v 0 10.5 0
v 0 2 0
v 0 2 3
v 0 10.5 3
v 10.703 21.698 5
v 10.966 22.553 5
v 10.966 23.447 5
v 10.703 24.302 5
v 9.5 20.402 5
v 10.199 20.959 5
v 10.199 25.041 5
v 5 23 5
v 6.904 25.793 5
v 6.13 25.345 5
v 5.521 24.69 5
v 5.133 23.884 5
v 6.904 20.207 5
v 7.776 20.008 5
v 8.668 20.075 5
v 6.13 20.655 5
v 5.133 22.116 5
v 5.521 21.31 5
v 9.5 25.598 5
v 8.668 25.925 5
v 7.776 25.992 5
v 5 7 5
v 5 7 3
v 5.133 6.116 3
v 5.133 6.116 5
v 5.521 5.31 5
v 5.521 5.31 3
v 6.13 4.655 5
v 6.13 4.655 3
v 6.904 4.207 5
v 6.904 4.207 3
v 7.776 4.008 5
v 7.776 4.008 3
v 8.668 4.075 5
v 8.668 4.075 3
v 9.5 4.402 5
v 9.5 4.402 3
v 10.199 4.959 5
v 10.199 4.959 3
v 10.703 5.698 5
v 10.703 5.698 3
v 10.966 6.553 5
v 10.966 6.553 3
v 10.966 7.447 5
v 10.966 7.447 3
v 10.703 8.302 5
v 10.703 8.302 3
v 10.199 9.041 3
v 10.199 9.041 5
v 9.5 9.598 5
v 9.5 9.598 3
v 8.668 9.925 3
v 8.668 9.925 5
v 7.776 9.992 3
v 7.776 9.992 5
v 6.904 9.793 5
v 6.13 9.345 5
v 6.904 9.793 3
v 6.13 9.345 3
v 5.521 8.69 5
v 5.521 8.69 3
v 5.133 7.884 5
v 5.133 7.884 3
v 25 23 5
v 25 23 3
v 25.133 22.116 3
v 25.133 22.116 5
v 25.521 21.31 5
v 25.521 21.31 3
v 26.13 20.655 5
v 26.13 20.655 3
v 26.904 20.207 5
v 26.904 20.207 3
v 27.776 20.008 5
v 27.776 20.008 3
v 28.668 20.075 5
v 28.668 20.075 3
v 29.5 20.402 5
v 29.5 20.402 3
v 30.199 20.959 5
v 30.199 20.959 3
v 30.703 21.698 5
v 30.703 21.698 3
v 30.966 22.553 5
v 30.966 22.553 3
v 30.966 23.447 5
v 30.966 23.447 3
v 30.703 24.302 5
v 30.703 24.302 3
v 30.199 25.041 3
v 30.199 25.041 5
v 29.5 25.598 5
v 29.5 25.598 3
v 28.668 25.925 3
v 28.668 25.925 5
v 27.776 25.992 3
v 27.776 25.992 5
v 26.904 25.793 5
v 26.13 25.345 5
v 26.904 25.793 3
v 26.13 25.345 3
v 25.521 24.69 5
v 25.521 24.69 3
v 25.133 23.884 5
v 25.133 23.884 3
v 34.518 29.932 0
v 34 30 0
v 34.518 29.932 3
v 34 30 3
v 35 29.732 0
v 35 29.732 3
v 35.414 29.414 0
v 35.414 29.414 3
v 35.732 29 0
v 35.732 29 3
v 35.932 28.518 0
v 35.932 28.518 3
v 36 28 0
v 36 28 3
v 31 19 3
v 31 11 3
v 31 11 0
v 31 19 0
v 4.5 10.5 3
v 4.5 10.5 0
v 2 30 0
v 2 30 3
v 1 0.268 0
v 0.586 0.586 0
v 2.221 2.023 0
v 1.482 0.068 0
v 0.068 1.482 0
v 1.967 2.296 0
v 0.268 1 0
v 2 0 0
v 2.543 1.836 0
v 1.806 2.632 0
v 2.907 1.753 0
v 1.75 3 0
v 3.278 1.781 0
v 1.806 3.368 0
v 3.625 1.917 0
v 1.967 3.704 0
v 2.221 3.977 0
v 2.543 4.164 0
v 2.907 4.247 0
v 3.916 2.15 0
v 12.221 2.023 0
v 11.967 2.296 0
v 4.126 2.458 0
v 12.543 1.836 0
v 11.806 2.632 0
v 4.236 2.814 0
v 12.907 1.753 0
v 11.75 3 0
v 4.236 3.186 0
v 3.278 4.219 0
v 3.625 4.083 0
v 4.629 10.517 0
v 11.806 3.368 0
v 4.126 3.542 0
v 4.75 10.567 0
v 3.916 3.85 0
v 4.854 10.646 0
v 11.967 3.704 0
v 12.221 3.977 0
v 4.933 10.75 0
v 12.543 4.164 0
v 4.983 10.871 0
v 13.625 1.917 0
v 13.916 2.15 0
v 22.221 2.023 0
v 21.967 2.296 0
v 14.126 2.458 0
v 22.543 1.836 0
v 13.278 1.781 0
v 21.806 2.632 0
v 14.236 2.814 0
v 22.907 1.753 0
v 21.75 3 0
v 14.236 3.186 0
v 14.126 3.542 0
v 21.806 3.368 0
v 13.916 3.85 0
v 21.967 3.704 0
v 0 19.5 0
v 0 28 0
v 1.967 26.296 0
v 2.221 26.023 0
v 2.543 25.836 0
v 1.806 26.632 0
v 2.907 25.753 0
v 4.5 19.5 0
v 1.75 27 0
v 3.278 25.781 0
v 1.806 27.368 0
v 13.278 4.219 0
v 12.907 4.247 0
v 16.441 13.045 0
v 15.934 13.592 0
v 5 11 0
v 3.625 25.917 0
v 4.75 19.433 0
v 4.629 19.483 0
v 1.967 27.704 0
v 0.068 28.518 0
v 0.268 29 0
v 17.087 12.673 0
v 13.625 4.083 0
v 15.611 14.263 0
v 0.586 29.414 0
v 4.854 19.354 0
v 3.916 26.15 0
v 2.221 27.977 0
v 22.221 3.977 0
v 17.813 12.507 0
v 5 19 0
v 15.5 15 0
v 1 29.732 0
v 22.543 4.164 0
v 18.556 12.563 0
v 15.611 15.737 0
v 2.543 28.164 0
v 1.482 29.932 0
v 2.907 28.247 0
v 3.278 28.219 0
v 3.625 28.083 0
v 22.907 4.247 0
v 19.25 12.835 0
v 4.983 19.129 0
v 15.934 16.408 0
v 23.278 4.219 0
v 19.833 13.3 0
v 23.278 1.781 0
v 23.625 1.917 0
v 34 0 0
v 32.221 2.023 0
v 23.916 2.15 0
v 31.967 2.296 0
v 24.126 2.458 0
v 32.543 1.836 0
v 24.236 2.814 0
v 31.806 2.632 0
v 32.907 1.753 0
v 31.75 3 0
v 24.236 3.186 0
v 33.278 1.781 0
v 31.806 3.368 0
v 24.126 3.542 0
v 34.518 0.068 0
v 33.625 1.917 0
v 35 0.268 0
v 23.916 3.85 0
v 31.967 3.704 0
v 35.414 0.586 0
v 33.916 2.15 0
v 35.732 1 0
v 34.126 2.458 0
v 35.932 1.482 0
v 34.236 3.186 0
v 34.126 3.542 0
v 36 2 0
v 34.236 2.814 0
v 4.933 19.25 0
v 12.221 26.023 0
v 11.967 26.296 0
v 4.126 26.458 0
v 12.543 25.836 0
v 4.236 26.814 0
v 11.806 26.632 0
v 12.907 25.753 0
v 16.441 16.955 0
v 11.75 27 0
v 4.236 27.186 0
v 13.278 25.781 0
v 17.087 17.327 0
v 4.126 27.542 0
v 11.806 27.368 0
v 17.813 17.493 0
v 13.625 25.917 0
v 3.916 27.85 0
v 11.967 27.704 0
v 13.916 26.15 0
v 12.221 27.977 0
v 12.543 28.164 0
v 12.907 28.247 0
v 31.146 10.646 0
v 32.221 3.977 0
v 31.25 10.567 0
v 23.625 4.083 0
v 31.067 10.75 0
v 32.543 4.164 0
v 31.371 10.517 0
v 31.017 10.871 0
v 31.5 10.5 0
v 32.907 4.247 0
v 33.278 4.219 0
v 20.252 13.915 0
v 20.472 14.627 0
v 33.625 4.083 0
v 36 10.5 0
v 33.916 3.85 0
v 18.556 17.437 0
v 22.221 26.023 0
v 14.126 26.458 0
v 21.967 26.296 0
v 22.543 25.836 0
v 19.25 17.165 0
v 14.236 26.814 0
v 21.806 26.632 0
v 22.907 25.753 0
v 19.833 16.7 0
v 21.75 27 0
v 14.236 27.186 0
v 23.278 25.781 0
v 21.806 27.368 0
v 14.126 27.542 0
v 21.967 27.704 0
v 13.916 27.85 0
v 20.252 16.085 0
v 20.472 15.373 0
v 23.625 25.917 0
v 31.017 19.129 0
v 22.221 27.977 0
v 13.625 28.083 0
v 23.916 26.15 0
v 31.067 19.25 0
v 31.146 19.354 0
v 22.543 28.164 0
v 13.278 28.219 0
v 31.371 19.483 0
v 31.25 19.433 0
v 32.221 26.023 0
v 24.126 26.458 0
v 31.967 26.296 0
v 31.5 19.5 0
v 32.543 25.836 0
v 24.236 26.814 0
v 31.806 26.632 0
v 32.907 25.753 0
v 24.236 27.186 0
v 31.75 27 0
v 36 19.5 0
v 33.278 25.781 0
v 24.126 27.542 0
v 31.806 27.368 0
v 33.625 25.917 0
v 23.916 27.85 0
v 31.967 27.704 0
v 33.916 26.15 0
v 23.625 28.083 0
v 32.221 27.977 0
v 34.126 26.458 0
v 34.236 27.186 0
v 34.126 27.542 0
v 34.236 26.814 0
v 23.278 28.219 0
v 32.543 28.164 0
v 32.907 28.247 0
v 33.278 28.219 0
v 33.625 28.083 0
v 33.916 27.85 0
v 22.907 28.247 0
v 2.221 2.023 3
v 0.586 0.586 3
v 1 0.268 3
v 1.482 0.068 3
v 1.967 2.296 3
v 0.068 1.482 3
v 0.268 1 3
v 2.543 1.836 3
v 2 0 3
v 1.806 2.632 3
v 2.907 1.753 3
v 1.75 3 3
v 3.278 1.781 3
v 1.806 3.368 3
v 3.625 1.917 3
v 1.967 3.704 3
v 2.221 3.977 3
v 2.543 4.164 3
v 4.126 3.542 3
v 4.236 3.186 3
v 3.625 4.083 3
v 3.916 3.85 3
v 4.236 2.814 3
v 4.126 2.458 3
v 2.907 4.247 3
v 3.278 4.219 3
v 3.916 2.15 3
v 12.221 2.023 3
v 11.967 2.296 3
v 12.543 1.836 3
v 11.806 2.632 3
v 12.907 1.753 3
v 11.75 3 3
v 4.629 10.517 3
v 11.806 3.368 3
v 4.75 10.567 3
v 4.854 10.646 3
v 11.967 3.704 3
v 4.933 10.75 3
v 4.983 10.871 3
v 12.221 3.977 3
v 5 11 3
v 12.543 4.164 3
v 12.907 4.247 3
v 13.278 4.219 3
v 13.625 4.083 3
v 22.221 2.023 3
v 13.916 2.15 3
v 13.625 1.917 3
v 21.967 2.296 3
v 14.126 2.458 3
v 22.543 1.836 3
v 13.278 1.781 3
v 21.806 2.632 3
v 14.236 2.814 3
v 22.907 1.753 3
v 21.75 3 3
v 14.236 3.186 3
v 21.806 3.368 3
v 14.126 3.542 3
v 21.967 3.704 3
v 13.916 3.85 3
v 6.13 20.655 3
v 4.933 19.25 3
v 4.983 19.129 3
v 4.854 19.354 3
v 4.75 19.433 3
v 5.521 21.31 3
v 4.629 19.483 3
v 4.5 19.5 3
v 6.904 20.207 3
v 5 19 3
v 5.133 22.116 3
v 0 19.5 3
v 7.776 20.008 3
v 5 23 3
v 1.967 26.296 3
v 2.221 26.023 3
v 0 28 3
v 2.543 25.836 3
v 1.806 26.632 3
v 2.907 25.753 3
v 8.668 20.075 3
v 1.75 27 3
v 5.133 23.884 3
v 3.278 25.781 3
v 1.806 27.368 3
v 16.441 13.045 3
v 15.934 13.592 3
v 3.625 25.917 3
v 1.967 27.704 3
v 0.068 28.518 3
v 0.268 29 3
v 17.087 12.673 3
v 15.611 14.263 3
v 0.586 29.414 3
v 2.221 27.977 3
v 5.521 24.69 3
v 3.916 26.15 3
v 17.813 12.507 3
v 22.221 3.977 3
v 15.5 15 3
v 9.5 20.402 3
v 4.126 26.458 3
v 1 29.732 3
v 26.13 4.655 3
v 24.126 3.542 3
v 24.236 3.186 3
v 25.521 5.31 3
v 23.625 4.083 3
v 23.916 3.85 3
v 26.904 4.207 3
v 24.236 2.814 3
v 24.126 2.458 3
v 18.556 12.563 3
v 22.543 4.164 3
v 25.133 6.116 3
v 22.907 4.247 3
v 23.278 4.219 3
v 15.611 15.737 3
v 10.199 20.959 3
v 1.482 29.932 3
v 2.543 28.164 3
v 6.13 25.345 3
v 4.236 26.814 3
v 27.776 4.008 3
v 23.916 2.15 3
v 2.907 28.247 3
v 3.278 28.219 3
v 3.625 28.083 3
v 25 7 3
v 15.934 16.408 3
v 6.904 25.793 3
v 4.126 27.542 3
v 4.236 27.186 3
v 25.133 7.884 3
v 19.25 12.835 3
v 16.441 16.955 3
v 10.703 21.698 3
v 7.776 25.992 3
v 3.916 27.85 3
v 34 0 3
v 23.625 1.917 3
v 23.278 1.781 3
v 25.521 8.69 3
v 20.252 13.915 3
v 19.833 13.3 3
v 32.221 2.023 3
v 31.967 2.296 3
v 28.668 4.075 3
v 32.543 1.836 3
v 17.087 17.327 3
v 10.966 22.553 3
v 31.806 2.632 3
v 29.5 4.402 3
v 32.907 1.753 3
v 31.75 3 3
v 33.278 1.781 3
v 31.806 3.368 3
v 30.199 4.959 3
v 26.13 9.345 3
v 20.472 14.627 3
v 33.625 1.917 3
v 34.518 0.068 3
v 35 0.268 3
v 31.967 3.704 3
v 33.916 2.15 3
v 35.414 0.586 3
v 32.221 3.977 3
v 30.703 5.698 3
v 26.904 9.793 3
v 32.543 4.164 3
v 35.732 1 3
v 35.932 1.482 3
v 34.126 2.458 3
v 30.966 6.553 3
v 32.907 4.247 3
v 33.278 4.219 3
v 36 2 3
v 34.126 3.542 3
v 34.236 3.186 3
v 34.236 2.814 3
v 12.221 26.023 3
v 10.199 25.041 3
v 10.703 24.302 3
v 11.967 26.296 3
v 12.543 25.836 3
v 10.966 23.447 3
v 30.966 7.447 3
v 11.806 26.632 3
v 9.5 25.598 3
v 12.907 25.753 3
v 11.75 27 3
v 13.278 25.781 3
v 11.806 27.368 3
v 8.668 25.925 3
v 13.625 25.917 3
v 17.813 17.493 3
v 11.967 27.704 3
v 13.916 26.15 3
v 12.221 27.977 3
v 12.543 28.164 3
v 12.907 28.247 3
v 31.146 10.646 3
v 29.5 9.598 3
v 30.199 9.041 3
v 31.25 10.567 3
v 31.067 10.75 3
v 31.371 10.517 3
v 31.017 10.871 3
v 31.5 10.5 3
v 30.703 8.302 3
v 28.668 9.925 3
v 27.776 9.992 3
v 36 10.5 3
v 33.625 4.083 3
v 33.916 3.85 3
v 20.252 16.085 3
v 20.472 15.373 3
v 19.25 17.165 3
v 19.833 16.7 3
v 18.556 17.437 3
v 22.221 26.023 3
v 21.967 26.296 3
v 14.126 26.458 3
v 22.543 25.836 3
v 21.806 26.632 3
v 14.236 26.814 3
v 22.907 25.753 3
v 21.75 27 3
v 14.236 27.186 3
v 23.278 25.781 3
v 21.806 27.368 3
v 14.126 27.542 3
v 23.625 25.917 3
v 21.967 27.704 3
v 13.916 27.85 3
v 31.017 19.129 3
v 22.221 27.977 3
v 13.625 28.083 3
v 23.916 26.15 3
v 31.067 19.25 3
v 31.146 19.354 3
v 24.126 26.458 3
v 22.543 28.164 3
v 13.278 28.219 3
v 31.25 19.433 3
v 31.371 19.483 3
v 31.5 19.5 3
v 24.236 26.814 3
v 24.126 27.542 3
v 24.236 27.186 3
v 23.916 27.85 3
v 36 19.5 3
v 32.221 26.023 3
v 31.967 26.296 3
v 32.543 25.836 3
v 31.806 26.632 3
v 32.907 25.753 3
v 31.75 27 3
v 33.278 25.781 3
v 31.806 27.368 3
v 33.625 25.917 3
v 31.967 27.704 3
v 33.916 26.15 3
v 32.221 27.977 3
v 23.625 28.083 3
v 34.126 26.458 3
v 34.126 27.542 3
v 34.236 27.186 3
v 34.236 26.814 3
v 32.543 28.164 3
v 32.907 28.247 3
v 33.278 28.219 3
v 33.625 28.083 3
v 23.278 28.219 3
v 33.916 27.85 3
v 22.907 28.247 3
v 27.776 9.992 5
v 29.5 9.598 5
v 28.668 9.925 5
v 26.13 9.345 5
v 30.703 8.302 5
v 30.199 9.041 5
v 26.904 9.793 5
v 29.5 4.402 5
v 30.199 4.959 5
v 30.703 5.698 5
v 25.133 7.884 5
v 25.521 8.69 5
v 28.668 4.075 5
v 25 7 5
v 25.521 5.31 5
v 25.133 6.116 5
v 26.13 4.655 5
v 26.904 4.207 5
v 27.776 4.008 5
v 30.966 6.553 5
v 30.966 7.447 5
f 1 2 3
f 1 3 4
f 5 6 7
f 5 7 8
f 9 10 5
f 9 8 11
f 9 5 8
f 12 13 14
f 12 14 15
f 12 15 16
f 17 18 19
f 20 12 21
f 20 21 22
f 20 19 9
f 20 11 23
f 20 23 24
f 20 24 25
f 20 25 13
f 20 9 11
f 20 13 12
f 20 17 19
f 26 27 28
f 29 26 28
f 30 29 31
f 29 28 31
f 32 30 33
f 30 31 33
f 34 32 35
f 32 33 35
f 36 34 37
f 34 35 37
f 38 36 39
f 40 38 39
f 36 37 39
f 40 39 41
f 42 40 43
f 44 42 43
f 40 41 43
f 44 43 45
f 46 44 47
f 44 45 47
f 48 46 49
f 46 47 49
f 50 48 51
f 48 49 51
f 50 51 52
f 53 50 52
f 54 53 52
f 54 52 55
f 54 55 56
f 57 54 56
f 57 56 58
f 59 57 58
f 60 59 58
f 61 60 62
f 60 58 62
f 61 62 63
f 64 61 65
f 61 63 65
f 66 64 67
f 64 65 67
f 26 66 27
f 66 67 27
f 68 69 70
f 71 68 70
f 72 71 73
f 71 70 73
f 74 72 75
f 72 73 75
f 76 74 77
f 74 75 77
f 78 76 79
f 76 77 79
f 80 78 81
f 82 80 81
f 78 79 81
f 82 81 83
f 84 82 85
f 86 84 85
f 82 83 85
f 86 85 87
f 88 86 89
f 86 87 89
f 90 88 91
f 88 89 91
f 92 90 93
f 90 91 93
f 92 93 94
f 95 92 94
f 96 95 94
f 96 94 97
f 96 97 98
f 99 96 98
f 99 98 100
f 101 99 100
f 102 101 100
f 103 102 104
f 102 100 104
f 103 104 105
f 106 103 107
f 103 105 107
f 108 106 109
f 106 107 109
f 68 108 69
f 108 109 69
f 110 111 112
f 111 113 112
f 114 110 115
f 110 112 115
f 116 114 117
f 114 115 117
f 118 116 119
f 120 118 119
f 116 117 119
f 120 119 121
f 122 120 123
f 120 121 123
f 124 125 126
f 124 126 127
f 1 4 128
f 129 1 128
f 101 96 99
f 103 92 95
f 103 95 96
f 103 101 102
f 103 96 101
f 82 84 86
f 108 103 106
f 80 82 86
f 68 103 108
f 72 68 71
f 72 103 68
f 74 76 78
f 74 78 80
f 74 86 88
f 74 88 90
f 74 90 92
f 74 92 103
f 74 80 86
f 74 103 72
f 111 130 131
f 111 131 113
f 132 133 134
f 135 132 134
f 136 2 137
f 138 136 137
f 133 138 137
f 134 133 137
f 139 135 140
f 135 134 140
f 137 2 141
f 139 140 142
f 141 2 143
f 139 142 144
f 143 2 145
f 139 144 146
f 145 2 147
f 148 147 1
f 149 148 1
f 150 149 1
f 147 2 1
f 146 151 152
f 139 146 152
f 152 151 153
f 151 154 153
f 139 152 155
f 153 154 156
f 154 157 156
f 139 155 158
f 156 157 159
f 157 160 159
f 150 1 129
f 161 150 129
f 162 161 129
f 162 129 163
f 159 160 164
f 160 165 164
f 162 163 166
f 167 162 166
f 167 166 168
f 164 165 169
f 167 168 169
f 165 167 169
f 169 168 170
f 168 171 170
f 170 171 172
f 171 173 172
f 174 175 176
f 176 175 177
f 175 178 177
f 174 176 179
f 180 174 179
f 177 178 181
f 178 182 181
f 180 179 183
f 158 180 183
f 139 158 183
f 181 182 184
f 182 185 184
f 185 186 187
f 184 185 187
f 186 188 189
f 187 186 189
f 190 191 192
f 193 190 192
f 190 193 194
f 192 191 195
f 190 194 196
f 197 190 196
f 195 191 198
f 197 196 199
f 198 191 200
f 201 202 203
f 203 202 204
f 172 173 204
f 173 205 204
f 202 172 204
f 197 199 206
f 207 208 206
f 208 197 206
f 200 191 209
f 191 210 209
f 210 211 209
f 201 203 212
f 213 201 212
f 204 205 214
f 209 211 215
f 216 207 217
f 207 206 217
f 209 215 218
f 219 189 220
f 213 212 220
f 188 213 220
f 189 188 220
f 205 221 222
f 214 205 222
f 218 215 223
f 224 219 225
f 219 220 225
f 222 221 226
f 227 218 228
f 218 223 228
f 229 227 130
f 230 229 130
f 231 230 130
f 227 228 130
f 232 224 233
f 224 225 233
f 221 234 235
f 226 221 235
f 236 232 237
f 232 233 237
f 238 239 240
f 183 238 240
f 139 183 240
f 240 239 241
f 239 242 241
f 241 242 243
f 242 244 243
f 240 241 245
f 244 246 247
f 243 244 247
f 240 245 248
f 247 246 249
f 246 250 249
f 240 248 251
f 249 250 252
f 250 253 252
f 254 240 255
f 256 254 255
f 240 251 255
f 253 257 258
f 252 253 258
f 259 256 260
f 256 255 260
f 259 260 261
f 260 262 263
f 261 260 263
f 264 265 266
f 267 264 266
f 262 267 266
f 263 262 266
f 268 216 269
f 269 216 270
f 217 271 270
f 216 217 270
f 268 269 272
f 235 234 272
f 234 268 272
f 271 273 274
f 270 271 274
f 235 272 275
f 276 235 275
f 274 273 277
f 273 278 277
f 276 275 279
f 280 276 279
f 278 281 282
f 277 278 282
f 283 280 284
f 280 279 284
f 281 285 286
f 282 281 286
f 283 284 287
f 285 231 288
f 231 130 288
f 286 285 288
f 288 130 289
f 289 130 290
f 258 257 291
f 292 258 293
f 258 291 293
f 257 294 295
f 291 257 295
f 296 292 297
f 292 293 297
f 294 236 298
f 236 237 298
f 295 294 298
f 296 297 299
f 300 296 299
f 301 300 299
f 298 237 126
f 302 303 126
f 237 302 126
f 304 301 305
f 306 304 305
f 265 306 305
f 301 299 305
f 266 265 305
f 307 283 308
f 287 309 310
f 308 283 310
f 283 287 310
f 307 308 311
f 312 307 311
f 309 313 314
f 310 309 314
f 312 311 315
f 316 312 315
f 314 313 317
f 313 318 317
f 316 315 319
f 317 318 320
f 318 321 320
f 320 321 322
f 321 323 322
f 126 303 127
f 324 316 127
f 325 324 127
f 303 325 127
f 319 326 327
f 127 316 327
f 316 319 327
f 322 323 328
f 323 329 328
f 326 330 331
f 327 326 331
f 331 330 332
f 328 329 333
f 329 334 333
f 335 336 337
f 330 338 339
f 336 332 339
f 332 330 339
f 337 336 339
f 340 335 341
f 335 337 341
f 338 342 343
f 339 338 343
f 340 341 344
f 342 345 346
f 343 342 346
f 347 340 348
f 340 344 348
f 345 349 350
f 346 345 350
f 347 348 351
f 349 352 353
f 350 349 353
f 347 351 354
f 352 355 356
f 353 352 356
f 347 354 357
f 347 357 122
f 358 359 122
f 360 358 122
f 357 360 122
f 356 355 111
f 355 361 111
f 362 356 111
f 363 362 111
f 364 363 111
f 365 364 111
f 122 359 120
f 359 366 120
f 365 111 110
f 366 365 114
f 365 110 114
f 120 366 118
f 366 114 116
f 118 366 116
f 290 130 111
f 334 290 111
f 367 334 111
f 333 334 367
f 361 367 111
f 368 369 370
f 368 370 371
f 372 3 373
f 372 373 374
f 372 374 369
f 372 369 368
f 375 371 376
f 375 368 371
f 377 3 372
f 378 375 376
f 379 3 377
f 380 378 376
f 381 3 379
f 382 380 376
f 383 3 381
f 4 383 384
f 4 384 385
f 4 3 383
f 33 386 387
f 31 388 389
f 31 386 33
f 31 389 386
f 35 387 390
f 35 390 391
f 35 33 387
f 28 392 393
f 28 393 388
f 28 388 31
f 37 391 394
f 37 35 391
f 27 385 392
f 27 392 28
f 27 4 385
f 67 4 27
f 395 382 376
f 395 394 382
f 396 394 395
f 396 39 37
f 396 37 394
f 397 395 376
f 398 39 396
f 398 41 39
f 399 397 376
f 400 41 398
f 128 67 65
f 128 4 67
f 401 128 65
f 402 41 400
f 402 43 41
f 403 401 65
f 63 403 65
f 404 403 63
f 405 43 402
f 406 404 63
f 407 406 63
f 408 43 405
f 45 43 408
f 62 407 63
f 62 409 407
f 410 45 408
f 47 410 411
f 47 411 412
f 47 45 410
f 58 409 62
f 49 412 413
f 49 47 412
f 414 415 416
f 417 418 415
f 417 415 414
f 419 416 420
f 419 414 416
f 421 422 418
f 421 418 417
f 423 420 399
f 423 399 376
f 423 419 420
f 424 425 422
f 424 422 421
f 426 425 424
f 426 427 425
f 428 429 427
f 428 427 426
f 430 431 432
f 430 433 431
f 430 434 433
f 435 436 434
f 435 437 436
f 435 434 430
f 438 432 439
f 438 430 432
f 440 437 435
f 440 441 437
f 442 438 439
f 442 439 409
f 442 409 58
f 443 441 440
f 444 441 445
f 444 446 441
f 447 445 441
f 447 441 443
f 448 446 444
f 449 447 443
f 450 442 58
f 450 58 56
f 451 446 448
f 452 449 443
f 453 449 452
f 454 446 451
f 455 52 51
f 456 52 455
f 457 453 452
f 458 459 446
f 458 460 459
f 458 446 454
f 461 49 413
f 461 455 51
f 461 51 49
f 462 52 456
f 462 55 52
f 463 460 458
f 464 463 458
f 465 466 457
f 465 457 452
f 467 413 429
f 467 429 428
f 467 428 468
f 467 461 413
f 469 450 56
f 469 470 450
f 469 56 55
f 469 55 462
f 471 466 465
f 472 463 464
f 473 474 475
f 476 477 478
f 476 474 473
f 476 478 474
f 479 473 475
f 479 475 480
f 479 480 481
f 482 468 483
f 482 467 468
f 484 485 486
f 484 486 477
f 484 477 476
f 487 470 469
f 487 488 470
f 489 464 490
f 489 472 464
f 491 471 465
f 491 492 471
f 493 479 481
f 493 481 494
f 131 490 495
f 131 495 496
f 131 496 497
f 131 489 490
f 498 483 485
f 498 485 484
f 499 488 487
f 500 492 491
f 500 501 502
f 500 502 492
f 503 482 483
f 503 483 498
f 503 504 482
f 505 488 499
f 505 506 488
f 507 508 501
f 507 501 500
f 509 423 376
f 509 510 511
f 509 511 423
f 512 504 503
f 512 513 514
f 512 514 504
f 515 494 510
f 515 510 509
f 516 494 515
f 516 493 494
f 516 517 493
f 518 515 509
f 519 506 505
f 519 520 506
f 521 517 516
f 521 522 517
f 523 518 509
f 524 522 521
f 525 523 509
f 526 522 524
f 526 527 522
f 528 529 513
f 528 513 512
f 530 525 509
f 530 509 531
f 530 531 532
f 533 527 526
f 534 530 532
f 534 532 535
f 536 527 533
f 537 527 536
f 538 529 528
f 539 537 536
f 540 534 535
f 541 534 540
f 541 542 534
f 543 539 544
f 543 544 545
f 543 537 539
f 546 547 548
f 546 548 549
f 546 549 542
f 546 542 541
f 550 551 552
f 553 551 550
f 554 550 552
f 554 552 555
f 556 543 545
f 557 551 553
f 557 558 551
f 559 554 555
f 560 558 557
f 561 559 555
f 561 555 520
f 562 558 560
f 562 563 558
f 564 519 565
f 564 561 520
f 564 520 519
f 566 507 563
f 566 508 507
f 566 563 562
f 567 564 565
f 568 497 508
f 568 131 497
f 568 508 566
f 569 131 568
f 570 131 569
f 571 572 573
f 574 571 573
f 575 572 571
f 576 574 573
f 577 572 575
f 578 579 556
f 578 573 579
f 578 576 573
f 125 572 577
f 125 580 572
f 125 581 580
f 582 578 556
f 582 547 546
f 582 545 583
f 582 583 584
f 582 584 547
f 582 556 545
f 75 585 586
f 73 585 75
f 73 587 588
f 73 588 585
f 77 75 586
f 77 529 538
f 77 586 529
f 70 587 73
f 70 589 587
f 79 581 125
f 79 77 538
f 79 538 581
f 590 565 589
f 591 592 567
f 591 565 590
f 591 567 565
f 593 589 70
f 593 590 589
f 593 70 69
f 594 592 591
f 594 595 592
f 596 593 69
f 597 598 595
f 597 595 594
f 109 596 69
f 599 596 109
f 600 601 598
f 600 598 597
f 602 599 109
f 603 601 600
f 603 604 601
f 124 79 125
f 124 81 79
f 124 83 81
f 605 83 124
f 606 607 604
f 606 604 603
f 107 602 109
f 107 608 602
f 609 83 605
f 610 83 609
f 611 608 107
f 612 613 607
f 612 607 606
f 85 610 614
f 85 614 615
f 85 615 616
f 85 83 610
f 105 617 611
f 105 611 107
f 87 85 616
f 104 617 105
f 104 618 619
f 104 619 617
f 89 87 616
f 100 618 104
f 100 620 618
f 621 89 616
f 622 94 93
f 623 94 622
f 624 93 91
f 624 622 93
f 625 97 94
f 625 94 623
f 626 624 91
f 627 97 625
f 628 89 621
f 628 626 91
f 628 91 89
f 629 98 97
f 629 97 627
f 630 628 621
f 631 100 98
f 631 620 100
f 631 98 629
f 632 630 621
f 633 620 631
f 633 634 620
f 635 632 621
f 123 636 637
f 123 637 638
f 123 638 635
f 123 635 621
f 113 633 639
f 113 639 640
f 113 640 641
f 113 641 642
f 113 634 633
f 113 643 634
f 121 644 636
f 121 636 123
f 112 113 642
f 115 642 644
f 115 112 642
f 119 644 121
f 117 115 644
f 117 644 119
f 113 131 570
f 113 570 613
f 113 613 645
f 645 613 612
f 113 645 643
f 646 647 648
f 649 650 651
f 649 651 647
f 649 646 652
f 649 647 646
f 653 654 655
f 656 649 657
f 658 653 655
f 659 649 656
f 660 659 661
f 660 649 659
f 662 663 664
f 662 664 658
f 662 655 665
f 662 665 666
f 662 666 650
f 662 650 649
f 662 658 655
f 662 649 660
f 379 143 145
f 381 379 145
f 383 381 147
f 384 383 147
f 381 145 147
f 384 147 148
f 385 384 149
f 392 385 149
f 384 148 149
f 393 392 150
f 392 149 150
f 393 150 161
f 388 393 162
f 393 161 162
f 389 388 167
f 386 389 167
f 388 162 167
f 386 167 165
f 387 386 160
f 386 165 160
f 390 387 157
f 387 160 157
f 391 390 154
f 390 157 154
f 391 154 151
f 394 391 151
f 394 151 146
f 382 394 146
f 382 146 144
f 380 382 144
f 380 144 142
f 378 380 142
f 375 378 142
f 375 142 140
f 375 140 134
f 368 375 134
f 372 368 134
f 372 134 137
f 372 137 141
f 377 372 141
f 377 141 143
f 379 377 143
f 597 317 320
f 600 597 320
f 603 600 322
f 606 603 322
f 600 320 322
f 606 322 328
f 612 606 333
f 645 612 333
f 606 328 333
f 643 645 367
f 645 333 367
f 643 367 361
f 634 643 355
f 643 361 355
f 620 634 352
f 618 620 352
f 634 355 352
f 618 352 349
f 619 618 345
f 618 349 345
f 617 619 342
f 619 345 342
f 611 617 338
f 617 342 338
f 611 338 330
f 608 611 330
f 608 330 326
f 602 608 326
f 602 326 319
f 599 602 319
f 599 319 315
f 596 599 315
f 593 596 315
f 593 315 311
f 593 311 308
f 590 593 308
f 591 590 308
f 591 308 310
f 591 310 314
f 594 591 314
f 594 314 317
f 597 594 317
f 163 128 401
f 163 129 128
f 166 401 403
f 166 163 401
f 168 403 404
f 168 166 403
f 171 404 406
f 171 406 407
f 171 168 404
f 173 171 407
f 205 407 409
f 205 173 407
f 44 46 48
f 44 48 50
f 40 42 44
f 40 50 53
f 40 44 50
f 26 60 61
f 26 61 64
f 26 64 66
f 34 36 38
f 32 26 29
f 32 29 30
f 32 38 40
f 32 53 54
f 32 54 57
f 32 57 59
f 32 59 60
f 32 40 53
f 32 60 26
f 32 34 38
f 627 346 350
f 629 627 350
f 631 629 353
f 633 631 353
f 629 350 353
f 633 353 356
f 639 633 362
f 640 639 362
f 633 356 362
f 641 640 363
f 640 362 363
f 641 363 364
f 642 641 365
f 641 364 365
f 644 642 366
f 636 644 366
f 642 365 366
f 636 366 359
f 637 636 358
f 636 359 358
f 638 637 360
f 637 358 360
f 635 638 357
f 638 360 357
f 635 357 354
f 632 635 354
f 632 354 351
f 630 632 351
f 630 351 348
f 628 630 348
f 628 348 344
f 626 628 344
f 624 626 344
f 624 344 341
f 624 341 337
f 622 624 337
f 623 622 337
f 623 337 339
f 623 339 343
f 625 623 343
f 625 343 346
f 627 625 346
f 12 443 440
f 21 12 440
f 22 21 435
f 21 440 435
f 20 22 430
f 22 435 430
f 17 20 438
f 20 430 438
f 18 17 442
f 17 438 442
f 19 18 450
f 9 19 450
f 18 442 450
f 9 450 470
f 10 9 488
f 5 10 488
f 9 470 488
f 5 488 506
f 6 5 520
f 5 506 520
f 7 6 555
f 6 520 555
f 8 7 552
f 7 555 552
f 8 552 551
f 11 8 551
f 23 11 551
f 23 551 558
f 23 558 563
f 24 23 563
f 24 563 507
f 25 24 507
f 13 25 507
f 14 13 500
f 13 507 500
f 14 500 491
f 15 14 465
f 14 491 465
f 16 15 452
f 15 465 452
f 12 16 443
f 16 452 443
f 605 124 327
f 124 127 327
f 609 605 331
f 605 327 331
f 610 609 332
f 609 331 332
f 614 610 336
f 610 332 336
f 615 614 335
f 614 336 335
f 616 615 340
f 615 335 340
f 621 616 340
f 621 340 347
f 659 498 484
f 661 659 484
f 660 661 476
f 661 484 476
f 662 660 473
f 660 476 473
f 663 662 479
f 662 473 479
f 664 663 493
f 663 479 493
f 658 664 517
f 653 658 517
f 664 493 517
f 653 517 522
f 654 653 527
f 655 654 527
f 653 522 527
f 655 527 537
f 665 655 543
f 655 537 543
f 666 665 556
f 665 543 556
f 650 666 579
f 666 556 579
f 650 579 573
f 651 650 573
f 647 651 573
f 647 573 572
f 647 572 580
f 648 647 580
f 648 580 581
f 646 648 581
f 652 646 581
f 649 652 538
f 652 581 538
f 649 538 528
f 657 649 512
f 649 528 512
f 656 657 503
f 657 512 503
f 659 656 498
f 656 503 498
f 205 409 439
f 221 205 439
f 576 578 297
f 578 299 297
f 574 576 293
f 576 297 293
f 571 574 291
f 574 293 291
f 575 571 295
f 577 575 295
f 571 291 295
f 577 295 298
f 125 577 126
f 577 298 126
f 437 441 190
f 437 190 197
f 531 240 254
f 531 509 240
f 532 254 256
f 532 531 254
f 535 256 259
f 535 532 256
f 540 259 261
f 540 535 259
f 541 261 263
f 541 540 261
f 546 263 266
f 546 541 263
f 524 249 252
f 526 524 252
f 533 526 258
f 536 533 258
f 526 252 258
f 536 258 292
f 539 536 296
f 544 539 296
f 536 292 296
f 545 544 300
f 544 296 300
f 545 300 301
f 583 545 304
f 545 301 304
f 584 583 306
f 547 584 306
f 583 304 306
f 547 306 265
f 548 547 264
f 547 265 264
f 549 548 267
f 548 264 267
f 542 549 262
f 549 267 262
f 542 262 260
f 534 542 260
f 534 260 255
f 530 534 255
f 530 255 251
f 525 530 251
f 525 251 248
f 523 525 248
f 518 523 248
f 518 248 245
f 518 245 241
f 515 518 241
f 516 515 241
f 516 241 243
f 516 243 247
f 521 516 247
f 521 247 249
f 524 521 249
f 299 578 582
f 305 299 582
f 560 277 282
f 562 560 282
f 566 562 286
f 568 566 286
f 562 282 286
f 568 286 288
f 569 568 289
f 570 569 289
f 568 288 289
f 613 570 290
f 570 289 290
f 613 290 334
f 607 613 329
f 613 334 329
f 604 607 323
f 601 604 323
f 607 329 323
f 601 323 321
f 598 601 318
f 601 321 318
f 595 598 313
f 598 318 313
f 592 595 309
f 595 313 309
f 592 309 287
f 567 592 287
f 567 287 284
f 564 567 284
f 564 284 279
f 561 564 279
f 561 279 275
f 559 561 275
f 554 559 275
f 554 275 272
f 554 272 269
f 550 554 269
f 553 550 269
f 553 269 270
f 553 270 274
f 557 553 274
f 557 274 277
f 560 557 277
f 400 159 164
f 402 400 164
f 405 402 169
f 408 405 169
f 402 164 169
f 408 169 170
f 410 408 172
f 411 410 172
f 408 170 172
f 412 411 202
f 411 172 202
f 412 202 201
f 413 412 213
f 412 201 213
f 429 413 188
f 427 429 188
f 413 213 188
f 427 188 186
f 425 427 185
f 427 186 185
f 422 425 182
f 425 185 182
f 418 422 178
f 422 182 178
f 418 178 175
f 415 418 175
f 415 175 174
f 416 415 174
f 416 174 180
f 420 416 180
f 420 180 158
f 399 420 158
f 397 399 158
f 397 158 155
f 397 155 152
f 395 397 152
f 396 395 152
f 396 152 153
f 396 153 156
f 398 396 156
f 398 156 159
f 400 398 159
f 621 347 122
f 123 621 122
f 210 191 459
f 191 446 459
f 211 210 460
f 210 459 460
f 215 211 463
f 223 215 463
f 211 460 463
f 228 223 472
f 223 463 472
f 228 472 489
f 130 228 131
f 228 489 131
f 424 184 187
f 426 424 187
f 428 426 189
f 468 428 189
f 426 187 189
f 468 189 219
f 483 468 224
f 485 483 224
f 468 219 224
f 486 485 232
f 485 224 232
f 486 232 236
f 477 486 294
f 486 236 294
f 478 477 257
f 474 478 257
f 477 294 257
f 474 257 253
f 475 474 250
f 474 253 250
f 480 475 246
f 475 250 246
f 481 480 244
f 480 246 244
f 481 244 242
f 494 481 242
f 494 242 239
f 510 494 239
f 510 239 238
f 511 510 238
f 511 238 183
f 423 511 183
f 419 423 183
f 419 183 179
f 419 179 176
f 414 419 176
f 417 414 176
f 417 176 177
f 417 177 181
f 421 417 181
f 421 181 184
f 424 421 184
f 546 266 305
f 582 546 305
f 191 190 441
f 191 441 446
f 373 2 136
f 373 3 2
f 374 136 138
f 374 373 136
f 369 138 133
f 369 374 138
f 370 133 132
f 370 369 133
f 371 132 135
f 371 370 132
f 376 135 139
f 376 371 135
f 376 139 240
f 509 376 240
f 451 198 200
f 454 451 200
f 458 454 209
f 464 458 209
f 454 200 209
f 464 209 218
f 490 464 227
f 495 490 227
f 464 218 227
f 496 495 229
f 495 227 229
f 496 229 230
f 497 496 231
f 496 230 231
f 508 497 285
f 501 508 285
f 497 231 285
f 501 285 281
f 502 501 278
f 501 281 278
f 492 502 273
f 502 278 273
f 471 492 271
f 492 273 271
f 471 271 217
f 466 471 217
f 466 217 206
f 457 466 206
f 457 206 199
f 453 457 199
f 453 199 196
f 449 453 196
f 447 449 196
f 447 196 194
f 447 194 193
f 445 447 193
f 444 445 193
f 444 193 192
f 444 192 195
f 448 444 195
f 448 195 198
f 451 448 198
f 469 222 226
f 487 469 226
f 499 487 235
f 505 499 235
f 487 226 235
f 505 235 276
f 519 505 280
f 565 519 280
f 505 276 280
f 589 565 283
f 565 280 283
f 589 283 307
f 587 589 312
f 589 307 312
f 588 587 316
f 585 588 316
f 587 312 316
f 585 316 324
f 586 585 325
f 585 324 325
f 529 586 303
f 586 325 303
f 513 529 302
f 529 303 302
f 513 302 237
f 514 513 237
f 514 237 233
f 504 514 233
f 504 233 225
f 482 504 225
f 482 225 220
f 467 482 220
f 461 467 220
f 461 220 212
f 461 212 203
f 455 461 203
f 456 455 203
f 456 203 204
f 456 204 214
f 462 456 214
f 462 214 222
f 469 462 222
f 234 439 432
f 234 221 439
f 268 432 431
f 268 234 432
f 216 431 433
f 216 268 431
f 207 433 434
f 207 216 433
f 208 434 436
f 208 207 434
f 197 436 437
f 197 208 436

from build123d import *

# Parameters (mm, degrees)
SKETCH_1_W          = 36
SKETCH_1_H          = 30
EXTRUDE_1_DEPTH     = 3
SKETCH_3_R          = 3
EXTRUDE_2_DEPTH     = 2
SKETCH_4_W          = 5
SKETCH_4_H          = 9
CUT_EXTRUDE_2_DEPTH = 47.957427527
HOLE_WIZARD_M6_1_D  = 5
FILLET_1_R          = 0.5
MM_1_D              = 2.5
FILLET_2_R          = 2


with BuildPart() as part:
    # 草图1 → 凸台-拉伸1 (new body)
    with BuildSketch(Plane.XY):
        with Locations((18, 15)):
            Rectangle(SKETCH_1_W, SKETCH_1_H)
    extrude(amount=EXTRUDE_1_DEPTH)

    # 草图3 → 凸台-拉伸2 (add)
    with BuildSketch(Plane.XY.offset(3)):
        with Locations(Location((8, 23, 0), (0, 0, 180))):
            Circle(SKETCH_3_R)
        with Locations(Location((8, 7, 0), (0, 0, 180))):
            Circle(SKETCH_3_R)
        with Locations(Location((28, 7, 0), (0, 0, 180))):
            Circle(SKETCH_3_R)
        with Locations(Location((28, 23, 0), (0, 0, 180))):
            Circle(SKETCH_3_R)
    extrude(amount=EXTRUDE_2_DEPTH)

    # 草图4 → 切除-拉伸2 (cut, through all)
    with BuildSketch(Plane.XY.offset(3)):
        with Locations((33.5, 15)):
            Rectangle(SKETCH_4_W, SKETCH_4_H)
        with Locations((2.5, 15)):
            Rectangle(SKETCH_4_W, SKETCH_4_H)
    extrude(amount=-CUT_EXTRUDE_2_DEPTH, mode=Mode.SUBTRACT)

    # M6 螺纹孔1 (through all)
    with Locations(Plane(origin=(18, 15, 3), x_dir=(1, 0, 0), z_dir=(0, 0, 1))):
        with Locations((0, 0)):
            Hole(HOLE_WIZARD_M6_1_D / 2)

    # 圆角1
    fillet_1_edges = [part.edges().sort_by_distance(p)[0] for p in [
        (5, 19.5, 1.5),
        (5, 10.5, 1.5),
        (31, 10.5, 1.5),
        (31, 19.5, 1.5),
    ]]
    fillet(fillet_1_edges, radius=FILLET_1_R)

    # 大小mm 暗销孔1 (through all)
    with Locations(Plane(origin=(3, 27, 3), x_dir=(1, 0, 0), z_dir=(0, 0, 1))):
        with Locations((0, 0), (10, 0), (20, 0), (30, 0), (30, -24), (20, -24), (10, -24), (0, -24)):
            Hole(MM_1_D / 2)

    # 圆角2
    fillet_2_edges = [part.edges().sort_by_distance(p)[0] for p in [
        (0, 30, 1.5),
        (36, 30, 1.5),
        (36, 0, 1.5),
        (0, 0, 1.5),
    ]]
    fillet(fillet_2_edges, radius=FILLET_2_R)


solid = part.part
